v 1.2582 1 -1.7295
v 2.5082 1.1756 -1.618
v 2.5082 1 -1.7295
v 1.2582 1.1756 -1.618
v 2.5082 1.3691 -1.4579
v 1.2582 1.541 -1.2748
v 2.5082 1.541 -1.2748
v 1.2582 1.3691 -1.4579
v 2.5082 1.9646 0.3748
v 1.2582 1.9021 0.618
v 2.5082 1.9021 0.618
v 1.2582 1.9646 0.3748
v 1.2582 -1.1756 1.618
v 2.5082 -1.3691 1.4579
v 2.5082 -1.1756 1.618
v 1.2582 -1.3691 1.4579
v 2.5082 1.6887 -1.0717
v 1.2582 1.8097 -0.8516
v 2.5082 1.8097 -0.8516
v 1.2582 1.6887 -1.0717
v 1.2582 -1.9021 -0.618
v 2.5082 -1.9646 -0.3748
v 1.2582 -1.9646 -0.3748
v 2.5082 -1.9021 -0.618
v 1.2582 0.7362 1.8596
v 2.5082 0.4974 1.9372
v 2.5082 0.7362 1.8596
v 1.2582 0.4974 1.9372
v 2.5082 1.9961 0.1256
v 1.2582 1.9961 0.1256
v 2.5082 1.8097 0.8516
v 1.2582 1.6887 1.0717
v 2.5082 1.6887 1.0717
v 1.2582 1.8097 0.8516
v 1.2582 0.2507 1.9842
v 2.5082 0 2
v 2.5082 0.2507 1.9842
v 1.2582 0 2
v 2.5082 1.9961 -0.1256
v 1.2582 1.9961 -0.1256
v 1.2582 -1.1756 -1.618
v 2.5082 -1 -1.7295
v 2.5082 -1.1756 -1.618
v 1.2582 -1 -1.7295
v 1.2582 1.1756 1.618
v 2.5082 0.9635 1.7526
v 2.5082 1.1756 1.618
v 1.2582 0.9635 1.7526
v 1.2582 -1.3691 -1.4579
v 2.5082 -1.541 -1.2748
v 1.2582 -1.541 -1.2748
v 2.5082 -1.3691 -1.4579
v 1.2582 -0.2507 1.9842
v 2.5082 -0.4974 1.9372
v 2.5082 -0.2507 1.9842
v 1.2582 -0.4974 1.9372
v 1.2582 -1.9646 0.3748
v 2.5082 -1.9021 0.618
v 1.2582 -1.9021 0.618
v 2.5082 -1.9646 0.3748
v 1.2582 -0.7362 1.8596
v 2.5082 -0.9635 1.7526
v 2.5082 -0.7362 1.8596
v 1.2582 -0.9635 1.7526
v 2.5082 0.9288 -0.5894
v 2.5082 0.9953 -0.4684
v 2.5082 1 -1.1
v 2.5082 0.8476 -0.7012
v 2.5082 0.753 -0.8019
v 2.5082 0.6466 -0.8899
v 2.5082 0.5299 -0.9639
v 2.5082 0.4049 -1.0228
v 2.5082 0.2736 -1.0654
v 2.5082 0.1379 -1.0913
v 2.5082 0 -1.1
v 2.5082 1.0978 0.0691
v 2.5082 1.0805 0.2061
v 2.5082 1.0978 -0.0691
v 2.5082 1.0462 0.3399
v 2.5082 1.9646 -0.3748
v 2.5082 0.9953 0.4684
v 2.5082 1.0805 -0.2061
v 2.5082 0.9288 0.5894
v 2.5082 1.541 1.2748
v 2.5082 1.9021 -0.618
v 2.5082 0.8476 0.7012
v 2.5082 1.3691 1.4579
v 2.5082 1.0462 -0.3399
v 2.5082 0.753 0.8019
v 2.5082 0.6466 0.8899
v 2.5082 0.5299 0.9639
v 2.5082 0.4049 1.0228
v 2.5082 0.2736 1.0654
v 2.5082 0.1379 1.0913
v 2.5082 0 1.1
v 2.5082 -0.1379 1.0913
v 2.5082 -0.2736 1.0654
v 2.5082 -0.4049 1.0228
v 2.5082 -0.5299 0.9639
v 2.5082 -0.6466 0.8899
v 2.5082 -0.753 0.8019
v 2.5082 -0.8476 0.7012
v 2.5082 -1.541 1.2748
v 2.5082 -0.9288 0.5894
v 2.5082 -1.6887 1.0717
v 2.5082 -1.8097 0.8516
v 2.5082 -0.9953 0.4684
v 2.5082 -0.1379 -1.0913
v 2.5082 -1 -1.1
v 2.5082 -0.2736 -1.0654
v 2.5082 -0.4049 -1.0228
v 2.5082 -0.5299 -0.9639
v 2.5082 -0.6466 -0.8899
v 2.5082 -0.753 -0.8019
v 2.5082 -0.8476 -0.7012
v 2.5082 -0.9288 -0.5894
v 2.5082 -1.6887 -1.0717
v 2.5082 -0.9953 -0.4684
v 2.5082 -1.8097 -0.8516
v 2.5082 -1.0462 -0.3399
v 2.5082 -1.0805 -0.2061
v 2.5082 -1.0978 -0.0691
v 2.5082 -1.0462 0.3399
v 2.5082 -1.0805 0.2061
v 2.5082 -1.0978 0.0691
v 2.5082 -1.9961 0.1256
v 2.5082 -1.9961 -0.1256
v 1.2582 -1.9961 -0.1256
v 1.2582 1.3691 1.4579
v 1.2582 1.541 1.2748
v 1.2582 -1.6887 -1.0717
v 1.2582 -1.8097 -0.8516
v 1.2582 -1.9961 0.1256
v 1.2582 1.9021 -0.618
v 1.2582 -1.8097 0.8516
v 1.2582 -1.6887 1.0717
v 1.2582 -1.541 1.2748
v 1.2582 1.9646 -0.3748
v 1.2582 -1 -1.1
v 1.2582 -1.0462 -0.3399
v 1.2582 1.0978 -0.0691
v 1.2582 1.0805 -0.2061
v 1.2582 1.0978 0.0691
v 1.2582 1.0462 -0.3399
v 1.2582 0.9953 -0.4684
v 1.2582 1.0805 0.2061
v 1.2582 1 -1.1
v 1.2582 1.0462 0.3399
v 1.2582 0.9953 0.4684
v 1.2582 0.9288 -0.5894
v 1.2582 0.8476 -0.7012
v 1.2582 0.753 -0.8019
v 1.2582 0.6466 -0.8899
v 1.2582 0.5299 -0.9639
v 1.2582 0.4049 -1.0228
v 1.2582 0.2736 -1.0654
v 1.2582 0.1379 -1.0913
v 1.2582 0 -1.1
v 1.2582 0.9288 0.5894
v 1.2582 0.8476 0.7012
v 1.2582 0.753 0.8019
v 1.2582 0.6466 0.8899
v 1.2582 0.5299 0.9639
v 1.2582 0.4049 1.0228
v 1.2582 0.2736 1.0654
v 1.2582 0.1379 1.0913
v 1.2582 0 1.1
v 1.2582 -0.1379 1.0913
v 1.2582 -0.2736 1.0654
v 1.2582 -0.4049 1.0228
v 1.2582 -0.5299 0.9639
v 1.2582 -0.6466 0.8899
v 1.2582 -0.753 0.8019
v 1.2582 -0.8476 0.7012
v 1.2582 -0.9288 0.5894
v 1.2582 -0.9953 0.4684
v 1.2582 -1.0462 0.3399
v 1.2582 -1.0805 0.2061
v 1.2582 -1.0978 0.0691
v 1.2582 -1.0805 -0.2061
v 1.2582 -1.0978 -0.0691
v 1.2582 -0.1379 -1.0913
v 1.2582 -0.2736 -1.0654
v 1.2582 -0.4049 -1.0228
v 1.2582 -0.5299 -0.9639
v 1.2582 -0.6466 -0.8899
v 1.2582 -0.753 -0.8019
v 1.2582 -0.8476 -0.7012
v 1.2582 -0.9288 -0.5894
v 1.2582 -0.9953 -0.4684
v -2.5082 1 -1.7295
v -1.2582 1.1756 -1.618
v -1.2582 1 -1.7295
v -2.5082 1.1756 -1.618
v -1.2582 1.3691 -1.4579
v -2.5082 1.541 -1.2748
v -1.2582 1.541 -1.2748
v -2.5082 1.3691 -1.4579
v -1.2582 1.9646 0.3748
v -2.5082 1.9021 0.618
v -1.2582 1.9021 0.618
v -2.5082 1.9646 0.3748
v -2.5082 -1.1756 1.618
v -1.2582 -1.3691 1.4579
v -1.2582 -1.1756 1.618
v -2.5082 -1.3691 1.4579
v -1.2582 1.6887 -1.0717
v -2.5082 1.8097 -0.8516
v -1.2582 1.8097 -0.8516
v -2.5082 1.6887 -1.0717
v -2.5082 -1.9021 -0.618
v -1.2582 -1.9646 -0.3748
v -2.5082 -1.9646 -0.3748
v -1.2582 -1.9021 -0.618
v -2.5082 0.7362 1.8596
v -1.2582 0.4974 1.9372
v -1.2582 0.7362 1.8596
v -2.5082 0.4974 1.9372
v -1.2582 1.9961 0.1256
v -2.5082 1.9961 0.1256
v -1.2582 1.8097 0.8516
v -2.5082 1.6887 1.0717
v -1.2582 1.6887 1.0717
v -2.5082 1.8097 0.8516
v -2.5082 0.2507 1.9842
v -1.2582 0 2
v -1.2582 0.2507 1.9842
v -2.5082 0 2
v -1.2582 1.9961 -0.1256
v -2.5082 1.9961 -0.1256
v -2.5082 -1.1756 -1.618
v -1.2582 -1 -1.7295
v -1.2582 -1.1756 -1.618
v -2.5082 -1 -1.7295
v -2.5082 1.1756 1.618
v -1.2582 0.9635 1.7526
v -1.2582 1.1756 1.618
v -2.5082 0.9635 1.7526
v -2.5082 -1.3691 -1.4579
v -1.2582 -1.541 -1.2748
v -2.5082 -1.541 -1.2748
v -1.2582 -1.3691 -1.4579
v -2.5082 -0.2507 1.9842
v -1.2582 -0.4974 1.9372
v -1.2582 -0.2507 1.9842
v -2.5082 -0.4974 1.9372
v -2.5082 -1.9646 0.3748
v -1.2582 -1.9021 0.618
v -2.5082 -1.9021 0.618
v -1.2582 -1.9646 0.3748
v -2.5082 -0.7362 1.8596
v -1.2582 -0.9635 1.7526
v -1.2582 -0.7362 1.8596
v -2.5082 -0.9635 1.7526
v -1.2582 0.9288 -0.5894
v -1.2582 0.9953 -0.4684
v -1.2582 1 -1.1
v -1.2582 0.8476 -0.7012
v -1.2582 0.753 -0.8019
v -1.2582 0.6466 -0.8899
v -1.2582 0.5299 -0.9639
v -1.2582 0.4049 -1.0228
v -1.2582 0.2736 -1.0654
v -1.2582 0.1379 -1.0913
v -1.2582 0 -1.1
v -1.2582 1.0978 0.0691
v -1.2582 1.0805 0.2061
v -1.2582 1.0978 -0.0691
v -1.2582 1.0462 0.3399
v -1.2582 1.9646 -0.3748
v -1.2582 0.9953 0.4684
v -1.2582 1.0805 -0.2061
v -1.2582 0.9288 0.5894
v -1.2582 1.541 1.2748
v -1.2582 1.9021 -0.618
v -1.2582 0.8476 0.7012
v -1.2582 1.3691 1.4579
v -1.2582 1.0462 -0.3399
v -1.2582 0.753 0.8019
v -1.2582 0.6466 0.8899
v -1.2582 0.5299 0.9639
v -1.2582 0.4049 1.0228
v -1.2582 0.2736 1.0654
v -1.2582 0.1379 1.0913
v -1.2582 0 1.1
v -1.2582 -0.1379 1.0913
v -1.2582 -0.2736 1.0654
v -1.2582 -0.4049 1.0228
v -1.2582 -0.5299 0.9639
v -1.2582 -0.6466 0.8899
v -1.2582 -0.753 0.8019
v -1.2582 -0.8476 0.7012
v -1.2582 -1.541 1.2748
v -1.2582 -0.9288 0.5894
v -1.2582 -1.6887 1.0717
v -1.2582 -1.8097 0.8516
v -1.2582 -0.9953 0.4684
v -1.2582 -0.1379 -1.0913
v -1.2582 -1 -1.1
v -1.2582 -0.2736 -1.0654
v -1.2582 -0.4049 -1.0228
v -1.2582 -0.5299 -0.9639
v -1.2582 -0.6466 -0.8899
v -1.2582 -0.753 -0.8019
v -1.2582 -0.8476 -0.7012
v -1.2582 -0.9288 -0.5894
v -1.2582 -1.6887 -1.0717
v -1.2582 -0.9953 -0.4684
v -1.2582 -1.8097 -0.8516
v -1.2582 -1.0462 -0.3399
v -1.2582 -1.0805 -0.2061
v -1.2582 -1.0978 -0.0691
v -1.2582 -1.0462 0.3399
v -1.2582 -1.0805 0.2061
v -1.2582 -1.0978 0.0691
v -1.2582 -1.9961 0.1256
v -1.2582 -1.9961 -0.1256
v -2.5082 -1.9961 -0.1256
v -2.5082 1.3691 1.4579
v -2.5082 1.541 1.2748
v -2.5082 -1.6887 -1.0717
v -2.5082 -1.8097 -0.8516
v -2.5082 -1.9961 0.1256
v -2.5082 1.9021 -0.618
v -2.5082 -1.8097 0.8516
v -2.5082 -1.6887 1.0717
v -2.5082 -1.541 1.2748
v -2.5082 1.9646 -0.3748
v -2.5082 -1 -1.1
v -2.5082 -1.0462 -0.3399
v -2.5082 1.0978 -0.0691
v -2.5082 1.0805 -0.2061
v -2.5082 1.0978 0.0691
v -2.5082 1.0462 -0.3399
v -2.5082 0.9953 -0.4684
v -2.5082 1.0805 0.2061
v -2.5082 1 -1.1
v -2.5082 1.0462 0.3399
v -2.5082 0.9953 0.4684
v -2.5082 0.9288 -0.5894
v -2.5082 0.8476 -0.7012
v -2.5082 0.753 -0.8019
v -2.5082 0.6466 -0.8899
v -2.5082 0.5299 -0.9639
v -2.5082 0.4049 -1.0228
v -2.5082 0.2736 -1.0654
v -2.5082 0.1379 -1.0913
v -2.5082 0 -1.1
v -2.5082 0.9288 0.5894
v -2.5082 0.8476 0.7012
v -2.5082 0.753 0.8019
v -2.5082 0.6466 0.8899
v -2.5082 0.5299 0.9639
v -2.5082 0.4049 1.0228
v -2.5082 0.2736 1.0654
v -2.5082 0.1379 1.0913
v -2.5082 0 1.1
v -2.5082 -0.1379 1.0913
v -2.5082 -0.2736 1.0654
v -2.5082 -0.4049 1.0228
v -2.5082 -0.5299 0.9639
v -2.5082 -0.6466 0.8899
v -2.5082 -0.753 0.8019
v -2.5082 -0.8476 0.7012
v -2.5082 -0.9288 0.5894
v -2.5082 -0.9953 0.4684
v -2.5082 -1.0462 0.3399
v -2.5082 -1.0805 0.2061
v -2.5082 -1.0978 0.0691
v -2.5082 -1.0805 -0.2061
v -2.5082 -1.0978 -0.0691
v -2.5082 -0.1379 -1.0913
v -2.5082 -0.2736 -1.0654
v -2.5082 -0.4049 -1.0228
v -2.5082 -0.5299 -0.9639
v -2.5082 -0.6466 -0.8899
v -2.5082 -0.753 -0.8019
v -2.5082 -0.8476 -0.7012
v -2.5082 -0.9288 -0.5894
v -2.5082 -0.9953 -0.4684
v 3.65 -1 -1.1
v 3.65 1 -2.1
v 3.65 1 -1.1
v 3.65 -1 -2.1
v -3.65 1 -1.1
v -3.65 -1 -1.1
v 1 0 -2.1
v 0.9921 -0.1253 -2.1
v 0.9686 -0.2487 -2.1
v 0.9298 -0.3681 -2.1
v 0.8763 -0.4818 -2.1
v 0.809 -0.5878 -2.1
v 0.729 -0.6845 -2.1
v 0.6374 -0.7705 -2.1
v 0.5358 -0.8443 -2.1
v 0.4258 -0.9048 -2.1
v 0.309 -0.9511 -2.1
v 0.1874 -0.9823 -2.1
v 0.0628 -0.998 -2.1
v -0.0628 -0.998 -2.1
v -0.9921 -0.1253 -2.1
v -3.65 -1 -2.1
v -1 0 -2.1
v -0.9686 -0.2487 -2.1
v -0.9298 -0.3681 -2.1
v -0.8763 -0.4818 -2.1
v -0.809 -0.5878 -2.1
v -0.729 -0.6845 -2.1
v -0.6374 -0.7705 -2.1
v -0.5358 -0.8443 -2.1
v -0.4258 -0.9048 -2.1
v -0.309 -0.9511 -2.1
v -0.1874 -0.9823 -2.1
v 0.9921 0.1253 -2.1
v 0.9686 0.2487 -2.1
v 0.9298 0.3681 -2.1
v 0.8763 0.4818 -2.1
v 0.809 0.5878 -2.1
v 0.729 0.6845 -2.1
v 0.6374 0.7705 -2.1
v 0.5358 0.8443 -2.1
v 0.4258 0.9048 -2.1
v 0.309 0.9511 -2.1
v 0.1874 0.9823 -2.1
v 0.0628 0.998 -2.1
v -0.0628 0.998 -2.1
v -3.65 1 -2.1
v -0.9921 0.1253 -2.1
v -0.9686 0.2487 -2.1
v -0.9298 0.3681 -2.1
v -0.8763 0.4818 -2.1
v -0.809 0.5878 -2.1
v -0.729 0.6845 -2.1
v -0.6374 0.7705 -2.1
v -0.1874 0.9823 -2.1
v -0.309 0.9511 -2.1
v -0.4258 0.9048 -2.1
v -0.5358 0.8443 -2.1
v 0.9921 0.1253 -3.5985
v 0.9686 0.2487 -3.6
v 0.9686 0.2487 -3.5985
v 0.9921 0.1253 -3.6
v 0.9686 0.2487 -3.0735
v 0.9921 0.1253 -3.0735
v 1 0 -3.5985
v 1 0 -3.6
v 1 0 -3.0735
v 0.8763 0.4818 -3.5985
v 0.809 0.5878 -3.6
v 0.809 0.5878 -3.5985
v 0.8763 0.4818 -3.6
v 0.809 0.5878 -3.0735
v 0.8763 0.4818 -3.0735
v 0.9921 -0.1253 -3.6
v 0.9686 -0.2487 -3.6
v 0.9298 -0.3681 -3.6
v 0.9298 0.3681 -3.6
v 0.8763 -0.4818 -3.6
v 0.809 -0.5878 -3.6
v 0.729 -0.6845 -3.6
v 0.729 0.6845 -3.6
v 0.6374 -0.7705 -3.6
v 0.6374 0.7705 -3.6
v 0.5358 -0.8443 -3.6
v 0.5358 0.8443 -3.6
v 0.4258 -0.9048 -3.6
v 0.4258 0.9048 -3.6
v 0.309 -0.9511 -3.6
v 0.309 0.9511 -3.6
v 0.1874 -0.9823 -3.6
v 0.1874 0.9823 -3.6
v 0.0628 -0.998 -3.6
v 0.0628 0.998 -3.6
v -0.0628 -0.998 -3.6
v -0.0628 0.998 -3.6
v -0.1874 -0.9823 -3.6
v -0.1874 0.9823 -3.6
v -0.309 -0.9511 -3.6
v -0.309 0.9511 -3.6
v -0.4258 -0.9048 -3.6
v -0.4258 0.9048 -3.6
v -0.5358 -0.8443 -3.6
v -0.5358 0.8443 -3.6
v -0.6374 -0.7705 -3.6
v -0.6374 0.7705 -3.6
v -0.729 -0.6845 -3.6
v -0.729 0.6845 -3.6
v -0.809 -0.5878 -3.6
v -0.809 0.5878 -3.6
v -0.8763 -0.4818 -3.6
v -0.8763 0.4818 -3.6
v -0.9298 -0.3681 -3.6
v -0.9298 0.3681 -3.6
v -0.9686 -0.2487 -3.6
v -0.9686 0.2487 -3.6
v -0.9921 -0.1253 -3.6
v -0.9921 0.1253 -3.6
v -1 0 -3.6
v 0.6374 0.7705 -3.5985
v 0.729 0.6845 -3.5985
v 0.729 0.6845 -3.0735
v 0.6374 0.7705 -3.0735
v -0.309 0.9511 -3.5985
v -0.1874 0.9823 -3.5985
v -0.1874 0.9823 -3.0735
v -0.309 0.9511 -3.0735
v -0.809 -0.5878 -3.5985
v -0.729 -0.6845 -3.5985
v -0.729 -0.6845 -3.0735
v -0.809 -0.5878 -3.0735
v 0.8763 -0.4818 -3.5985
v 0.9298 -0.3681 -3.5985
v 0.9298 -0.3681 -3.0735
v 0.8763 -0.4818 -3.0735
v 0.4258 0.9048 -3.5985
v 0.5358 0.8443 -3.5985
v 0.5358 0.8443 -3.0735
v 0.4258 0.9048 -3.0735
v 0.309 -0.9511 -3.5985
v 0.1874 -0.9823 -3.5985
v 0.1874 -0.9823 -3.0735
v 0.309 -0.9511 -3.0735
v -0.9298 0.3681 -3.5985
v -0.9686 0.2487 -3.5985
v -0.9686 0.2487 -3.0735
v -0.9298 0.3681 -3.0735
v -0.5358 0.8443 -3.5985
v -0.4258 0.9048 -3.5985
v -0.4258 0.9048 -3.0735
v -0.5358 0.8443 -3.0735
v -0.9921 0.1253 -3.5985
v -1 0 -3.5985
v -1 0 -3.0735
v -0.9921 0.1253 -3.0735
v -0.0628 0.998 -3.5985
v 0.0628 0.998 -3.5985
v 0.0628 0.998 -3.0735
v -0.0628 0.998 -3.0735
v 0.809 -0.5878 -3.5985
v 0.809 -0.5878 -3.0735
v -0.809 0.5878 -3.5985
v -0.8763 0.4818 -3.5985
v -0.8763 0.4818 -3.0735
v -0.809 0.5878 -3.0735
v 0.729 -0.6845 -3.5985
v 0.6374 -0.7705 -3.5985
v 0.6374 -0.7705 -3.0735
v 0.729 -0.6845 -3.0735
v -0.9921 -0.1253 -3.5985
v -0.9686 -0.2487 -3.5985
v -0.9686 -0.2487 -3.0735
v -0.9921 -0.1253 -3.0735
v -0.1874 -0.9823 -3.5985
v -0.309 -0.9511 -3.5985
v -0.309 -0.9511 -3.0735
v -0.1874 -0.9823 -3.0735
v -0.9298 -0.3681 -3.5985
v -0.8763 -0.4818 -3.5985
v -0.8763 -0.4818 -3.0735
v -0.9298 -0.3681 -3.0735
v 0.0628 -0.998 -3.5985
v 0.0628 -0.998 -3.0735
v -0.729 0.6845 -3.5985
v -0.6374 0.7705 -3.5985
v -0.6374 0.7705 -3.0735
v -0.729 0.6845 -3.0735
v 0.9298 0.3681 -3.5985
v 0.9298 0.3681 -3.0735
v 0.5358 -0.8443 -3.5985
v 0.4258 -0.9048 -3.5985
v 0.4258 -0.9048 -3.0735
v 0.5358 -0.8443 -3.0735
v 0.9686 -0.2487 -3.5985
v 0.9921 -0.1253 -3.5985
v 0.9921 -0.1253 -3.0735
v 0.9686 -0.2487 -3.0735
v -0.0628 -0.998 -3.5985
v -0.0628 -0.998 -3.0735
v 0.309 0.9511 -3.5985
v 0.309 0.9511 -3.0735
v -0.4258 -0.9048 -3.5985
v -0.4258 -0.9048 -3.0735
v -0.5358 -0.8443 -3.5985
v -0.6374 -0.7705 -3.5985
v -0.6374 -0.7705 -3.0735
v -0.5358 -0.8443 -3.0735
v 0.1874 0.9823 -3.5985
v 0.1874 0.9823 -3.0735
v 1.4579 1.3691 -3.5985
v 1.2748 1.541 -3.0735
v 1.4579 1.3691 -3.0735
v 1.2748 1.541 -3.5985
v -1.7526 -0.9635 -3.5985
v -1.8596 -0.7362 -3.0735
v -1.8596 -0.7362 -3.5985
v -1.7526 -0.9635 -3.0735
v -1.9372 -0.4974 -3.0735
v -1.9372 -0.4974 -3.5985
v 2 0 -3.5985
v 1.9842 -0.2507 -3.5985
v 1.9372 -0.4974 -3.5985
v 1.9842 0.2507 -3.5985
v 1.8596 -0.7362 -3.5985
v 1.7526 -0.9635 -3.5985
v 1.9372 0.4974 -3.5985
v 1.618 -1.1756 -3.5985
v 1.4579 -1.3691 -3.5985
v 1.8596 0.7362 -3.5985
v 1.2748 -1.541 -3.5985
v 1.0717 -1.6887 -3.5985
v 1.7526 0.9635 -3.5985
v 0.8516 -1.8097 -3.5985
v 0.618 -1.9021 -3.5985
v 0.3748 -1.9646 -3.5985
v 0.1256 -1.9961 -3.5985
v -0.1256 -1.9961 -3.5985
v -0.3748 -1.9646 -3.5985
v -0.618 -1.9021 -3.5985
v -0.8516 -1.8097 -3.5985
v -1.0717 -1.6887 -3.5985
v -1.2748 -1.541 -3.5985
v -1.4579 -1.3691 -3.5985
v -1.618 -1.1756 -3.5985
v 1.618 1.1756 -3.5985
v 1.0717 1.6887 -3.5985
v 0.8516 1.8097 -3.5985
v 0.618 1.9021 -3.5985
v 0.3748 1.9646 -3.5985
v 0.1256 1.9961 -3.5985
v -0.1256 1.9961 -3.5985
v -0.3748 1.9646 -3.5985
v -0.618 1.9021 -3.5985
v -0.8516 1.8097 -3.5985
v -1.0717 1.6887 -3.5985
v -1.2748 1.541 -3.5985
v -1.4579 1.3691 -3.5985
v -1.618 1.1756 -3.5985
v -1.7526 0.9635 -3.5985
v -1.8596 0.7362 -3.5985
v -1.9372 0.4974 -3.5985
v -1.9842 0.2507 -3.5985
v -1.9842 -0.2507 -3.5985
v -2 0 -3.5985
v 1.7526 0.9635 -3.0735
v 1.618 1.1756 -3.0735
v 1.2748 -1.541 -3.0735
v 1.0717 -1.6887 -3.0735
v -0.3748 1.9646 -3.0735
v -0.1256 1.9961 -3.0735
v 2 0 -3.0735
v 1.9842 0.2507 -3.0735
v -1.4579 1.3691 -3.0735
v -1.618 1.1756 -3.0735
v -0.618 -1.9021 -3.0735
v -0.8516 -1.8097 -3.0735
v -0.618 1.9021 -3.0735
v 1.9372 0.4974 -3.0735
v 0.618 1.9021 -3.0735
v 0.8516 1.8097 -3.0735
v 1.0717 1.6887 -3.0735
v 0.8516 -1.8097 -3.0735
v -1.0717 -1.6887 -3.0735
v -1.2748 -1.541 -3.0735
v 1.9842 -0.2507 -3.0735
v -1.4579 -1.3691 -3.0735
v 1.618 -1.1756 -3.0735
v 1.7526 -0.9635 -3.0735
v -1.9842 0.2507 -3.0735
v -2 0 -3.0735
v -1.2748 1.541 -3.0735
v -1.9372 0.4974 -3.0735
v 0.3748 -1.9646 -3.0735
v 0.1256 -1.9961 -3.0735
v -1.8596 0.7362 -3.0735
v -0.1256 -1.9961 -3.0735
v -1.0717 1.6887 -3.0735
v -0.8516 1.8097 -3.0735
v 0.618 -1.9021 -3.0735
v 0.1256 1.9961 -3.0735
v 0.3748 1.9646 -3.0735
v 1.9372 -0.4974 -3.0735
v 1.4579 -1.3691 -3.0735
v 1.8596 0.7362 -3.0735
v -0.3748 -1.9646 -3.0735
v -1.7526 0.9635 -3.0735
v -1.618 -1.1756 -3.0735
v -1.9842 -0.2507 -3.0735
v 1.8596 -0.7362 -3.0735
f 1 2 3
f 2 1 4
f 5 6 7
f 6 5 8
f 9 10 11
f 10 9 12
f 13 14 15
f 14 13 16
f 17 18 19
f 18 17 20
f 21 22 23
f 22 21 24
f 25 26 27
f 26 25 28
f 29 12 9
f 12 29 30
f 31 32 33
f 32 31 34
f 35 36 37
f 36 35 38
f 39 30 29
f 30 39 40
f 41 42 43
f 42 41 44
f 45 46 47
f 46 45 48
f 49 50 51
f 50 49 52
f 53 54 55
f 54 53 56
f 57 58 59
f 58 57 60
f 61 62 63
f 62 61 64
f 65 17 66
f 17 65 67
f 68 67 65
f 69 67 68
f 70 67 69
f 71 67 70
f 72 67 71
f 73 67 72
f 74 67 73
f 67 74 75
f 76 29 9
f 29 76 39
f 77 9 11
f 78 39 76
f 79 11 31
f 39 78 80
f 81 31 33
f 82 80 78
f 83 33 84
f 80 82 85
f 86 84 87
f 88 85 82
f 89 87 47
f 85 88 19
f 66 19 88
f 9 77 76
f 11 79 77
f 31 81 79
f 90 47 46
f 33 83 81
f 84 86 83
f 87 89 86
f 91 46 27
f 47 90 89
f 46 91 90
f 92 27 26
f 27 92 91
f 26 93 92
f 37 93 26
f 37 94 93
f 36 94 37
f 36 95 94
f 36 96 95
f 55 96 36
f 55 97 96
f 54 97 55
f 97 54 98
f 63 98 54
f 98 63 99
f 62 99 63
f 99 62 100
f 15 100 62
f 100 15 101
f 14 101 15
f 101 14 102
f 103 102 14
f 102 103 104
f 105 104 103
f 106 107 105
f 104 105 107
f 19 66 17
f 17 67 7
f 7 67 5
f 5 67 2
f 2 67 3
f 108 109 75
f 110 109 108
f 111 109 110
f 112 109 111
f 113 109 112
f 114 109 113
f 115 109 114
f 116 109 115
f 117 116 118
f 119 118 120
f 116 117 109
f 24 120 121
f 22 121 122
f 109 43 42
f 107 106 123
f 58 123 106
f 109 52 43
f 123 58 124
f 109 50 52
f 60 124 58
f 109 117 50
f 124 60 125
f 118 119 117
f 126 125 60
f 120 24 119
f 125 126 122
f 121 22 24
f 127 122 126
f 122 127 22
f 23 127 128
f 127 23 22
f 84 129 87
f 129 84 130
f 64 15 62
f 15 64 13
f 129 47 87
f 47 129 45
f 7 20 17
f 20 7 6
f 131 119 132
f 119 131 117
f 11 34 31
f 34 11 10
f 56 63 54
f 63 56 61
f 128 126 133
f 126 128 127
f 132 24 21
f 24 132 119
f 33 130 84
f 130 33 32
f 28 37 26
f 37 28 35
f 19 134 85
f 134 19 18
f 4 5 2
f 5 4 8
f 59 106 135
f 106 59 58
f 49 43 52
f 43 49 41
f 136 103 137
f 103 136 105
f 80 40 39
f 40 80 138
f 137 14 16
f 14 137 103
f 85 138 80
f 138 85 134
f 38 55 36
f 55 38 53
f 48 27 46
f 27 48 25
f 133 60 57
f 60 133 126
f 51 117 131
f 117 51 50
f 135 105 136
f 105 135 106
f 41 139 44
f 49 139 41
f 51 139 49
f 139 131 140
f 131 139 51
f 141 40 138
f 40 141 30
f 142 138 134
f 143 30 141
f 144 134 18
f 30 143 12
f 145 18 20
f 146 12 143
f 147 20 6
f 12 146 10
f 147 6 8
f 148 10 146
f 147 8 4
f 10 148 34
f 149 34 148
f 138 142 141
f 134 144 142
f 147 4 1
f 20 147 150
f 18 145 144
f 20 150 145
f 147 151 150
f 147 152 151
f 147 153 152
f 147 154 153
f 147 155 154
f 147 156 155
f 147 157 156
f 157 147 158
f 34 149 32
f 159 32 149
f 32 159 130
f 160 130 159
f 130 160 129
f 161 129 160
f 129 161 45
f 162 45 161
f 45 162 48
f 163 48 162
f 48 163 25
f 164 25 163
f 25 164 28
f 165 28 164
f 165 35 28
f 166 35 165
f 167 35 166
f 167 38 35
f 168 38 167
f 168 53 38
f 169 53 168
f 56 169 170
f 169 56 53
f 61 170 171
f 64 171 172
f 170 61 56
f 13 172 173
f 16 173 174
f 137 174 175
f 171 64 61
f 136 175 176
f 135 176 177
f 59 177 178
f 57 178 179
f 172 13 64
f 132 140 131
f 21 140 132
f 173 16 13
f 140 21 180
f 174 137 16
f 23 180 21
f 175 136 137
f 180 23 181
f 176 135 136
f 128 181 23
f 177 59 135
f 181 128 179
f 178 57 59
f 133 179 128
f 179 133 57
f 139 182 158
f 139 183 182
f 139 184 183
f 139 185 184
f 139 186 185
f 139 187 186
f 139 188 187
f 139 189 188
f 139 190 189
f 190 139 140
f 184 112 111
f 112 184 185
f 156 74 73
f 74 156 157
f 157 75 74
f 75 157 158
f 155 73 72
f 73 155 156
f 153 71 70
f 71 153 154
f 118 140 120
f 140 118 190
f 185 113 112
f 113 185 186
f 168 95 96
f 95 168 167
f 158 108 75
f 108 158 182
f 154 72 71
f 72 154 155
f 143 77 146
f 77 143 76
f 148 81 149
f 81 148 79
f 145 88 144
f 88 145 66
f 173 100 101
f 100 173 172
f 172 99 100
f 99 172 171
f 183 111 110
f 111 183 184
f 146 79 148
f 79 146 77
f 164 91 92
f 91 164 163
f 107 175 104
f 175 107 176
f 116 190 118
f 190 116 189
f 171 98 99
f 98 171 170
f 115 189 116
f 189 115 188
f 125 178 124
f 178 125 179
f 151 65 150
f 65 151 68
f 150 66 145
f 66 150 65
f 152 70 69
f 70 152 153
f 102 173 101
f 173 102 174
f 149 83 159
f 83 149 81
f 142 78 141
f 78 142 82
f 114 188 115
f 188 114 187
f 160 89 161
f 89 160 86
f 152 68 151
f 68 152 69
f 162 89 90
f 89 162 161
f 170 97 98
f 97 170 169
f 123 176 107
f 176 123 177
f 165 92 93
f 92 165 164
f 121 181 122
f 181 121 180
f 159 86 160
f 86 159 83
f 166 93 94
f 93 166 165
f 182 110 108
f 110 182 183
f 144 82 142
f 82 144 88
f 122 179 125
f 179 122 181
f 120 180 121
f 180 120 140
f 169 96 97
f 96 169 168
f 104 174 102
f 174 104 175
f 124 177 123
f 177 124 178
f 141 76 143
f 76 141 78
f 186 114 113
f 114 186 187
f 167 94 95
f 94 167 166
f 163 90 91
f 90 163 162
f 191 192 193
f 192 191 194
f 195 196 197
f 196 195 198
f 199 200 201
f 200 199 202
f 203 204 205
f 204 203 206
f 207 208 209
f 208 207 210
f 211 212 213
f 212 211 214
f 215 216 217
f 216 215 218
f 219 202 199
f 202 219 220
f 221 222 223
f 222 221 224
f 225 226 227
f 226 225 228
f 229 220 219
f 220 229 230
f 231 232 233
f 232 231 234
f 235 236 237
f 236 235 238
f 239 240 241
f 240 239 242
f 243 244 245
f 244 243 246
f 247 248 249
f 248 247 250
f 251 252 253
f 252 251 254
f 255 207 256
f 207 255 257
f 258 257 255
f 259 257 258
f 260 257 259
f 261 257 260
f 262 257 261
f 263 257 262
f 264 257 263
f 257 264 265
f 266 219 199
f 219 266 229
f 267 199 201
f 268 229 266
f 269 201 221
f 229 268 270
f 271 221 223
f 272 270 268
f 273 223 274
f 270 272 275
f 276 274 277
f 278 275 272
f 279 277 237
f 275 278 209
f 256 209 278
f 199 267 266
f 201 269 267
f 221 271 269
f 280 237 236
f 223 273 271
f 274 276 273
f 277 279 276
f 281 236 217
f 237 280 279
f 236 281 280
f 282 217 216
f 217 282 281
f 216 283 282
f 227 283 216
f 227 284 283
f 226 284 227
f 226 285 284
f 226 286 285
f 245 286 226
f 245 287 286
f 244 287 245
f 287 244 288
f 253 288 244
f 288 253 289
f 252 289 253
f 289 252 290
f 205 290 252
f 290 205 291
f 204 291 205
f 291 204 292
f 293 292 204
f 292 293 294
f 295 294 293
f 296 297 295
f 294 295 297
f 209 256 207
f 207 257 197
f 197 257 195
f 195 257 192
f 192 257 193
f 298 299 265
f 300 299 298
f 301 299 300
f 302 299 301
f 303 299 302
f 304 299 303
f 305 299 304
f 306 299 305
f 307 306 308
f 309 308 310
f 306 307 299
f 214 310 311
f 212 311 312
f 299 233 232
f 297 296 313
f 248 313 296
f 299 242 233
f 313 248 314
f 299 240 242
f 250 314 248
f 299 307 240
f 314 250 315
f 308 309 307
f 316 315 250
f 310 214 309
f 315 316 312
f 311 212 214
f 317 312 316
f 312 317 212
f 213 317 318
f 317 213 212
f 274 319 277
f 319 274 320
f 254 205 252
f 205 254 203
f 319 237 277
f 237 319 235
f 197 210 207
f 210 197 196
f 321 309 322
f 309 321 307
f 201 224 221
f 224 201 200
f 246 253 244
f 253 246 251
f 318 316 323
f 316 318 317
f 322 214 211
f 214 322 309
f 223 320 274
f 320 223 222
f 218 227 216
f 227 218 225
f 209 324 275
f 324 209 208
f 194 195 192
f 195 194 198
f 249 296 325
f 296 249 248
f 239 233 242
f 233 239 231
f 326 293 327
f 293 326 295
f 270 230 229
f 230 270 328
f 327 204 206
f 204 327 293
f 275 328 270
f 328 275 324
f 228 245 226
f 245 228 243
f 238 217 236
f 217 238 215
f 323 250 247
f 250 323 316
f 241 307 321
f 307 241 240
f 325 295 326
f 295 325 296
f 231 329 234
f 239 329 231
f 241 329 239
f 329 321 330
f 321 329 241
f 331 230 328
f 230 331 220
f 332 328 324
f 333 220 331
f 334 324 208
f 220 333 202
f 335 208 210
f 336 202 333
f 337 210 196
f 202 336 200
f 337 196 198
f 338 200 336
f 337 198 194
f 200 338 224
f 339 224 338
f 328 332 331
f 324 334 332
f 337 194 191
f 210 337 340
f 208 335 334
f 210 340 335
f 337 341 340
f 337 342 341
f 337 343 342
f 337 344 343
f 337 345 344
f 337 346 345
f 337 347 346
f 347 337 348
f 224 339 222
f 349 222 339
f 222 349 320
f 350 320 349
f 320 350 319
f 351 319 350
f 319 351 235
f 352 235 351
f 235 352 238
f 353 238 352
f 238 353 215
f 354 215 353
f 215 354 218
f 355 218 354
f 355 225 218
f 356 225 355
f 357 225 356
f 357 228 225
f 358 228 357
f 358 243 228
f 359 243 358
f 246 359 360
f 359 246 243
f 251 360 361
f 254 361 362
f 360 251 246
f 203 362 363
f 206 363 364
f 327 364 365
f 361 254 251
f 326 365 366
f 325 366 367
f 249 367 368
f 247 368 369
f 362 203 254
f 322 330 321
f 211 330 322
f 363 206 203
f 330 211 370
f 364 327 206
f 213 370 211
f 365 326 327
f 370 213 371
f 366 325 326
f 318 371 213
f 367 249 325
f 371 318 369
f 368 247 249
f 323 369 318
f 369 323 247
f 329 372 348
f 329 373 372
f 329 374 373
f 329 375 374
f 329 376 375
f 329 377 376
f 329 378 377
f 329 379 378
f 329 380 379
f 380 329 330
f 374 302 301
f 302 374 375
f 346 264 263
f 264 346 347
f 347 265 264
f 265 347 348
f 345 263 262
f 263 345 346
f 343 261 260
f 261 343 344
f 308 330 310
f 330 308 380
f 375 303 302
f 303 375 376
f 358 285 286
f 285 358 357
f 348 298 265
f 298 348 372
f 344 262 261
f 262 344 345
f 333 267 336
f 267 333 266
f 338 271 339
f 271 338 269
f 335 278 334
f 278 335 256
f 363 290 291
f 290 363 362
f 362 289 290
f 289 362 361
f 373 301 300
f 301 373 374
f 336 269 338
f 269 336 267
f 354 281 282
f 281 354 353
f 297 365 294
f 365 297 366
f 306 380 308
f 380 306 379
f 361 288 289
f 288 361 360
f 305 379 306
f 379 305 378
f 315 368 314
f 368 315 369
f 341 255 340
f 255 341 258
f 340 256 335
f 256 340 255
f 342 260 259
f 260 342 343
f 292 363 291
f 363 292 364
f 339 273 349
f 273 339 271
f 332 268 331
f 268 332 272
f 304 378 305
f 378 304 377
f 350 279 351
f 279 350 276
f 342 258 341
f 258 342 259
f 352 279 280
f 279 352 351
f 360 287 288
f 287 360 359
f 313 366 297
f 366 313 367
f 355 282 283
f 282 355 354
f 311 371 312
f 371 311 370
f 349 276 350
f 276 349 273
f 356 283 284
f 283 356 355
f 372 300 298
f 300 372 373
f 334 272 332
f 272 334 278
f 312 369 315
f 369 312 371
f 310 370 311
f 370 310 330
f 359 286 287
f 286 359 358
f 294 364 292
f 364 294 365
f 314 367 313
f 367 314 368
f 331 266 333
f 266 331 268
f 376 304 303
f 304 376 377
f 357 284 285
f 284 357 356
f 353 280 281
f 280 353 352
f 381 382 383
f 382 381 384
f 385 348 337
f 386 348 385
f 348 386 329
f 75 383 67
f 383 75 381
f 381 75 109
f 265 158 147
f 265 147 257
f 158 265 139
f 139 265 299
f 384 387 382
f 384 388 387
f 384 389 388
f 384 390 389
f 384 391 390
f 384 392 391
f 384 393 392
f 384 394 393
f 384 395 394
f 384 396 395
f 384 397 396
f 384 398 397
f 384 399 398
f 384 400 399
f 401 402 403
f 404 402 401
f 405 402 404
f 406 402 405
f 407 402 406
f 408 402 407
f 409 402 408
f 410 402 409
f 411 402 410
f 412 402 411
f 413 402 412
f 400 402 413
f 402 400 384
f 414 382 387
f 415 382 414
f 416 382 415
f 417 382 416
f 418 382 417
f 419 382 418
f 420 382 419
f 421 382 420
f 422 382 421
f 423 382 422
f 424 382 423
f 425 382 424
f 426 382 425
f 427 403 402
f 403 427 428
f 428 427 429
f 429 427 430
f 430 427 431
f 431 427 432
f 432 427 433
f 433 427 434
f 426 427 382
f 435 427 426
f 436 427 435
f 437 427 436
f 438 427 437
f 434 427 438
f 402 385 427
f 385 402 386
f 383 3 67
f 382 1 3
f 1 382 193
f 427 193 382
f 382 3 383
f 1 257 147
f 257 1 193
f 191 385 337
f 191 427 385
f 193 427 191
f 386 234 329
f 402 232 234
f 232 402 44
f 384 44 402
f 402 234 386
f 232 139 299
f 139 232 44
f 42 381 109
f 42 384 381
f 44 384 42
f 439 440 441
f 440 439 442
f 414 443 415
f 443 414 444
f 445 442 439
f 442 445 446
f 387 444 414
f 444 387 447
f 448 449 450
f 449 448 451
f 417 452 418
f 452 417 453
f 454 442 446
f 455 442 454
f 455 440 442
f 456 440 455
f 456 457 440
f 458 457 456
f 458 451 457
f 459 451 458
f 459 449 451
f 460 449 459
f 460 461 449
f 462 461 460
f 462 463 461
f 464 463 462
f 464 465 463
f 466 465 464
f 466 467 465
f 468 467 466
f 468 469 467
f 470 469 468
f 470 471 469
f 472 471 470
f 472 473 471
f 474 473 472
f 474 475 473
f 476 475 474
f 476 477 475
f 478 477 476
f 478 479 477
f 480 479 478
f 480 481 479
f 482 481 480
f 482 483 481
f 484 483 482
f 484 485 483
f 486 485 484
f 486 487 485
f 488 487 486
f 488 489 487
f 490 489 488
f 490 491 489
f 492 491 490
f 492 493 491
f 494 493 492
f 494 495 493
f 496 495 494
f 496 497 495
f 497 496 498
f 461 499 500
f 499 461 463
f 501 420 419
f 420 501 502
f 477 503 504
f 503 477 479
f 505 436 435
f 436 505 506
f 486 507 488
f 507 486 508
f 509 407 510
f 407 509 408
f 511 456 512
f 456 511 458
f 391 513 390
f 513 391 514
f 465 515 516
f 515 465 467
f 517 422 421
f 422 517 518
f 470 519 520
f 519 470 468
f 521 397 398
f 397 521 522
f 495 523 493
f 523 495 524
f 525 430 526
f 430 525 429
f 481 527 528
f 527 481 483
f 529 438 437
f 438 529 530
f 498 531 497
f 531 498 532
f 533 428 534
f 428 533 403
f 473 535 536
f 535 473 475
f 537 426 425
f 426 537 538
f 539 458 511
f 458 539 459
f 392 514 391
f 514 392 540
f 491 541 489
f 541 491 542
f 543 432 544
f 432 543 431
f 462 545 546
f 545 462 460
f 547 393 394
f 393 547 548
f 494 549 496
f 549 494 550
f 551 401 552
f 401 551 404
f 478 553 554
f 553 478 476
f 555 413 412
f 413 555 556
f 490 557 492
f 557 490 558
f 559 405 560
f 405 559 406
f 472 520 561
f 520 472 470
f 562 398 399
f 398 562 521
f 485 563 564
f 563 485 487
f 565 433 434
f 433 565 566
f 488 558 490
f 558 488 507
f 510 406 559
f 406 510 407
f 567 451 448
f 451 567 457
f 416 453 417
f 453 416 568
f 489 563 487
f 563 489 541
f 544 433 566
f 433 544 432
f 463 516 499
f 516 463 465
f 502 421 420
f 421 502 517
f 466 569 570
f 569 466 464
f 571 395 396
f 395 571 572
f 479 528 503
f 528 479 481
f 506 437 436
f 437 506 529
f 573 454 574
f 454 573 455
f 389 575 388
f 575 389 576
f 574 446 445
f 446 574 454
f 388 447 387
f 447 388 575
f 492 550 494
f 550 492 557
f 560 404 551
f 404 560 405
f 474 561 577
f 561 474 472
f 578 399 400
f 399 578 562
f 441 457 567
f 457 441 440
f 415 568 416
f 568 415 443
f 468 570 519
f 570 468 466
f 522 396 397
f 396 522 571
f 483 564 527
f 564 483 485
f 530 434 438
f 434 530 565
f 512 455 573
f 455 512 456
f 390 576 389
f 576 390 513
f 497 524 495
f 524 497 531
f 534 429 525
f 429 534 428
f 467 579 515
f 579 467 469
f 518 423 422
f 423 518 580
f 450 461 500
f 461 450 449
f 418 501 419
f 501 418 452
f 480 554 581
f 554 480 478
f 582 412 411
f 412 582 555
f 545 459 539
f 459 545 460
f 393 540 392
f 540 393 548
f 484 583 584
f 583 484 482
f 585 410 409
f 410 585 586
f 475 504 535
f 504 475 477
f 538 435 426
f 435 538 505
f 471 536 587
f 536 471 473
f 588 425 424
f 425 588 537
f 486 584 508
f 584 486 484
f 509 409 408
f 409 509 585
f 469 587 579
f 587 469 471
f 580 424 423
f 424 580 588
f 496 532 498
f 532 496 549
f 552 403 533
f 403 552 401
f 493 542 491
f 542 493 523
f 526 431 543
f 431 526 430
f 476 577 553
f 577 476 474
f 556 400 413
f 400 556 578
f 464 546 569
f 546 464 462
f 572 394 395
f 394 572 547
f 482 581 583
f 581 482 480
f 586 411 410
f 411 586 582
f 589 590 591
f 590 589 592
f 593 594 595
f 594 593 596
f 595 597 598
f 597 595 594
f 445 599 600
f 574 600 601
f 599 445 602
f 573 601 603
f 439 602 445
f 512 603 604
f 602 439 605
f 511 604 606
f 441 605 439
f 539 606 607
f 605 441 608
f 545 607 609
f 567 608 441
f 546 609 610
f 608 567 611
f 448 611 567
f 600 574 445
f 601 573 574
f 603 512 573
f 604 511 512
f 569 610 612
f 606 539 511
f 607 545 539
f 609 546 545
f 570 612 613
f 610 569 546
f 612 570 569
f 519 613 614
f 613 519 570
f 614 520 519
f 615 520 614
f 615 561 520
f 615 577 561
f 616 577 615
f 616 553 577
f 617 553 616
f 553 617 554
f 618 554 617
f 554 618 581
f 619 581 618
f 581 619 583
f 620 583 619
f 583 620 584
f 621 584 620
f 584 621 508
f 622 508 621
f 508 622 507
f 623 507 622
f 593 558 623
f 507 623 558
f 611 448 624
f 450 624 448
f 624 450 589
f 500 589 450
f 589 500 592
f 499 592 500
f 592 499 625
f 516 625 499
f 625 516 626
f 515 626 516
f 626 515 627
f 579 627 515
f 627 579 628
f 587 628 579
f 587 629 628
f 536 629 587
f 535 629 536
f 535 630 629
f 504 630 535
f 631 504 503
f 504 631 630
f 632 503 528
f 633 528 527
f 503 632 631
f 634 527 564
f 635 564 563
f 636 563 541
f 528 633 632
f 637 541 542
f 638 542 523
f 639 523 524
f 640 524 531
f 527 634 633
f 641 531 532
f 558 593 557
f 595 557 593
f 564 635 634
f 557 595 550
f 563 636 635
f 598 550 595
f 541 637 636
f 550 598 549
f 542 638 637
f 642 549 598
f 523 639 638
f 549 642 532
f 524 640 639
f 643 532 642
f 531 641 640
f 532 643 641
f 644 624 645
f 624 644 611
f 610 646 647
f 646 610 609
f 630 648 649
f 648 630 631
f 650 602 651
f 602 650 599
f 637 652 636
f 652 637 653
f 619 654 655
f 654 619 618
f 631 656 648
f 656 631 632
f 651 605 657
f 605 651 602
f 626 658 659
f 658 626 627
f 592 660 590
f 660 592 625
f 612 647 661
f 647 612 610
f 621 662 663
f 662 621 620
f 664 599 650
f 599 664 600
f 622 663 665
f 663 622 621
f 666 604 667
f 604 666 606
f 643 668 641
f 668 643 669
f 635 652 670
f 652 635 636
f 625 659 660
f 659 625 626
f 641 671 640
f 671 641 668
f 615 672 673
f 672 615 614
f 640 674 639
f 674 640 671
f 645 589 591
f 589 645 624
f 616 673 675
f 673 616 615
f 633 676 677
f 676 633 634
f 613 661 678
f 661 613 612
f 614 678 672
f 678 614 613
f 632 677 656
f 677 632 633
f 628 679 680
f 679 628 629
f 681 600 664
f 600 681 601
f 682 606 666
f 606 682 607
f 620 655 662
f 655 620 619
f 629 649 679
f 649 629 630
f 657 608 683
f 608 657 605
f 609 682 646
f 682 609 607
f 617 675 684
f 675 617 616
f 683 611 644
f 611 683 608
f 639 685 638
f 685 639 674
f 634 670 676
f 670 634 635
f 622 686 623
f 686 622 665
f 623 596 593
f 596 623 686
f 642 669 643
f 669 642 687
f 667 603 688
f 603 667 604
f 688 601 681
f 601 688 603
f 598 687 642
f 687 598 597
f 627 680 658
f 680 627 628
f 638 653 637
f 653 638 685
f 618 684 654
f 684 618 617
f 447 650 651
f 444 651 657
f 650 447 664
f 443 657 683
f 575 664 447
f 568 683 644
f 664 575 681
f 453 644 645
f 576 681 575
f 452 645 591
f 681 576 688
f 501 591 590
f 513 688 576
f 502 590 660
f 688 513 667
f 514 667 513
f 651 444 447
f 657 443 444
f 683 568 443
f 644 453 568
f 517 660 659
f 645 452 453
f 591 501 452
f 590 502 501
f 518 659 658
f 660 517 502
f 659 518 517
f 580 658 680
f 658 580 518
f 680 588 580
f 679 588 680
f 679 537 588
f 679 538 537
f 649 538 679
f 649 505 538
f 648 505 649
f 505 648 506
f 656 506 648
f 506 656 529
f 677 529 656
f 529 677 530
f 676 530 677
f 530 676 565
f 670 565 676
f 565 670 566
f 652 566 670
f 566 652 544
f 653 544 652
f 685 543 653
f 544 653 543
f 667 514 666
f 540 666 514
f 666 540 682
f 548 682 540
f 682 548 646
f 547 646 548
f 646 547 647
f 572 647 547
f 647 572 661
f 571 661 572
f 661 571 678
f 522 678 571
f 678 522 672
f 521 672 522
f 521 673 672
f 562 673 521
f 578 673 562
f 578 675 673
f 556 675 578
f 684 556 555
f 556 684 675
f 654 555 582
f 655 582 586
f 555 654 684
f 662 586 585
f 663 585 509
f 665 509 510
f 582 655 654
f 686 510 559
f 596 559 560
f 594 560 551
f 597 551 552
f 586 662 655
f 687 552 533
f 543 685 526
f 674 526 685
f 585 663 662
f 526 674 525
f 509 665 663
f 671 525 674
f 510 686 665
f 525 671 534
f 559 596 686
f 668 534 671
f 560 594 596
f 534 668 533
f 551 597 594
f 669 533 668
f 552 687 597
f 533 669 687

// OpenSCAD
// file: constants.scad
$fn = 50;

leaf_x = 6;
leaf_y = 19;
leaf_z = 0.8;
leaf_angle = 30;
leaf_wide_angle = 20;
leaf_open_angle = 90;
leaf_slide_angle = 50;
leaf_radius = 12;
leafs = 6;

axis_length = 10;
axis_radius = 1;
bearing_length = 1.25;
tolerance = 0.1;
// main file
include <constants.scad>

module bearing_bar() {
    color([0.7, 0.70, 0.3, 1]) {
        // 2 bearings
        rotate([0, 90, 0]) {
            for (sig = [1,-1]) translate([0, 0, sig*axis_length/5.31])
                difference() { 
                    cylinder(bearing_length, axis_radius*2, axis_radius*2, center=true);
                    cylinder(bearing_length, axis_radius+tolerance, axis_radius+tolerance, center=true);
                }
        }
        
        // bar
        translate([0, 0, -leaf_z*2])
            cube([axis_length - 2*(bearing_length+tolerance), axis_radius*2, axis_radius], center=true);
        
        // bearing axe
        translate([0, 0, -leaf_z*3])
            cylinder(bearing_length*2-tolerance, axis_radius, axis_radius, center=true);
        translate([0, 0, -leaf_z*4.17])
            cylinder(bearing_length/2-tolerance, axis_radius*2, axis_radius*2, center=true);
    }
}

// main
bearing_bar();
